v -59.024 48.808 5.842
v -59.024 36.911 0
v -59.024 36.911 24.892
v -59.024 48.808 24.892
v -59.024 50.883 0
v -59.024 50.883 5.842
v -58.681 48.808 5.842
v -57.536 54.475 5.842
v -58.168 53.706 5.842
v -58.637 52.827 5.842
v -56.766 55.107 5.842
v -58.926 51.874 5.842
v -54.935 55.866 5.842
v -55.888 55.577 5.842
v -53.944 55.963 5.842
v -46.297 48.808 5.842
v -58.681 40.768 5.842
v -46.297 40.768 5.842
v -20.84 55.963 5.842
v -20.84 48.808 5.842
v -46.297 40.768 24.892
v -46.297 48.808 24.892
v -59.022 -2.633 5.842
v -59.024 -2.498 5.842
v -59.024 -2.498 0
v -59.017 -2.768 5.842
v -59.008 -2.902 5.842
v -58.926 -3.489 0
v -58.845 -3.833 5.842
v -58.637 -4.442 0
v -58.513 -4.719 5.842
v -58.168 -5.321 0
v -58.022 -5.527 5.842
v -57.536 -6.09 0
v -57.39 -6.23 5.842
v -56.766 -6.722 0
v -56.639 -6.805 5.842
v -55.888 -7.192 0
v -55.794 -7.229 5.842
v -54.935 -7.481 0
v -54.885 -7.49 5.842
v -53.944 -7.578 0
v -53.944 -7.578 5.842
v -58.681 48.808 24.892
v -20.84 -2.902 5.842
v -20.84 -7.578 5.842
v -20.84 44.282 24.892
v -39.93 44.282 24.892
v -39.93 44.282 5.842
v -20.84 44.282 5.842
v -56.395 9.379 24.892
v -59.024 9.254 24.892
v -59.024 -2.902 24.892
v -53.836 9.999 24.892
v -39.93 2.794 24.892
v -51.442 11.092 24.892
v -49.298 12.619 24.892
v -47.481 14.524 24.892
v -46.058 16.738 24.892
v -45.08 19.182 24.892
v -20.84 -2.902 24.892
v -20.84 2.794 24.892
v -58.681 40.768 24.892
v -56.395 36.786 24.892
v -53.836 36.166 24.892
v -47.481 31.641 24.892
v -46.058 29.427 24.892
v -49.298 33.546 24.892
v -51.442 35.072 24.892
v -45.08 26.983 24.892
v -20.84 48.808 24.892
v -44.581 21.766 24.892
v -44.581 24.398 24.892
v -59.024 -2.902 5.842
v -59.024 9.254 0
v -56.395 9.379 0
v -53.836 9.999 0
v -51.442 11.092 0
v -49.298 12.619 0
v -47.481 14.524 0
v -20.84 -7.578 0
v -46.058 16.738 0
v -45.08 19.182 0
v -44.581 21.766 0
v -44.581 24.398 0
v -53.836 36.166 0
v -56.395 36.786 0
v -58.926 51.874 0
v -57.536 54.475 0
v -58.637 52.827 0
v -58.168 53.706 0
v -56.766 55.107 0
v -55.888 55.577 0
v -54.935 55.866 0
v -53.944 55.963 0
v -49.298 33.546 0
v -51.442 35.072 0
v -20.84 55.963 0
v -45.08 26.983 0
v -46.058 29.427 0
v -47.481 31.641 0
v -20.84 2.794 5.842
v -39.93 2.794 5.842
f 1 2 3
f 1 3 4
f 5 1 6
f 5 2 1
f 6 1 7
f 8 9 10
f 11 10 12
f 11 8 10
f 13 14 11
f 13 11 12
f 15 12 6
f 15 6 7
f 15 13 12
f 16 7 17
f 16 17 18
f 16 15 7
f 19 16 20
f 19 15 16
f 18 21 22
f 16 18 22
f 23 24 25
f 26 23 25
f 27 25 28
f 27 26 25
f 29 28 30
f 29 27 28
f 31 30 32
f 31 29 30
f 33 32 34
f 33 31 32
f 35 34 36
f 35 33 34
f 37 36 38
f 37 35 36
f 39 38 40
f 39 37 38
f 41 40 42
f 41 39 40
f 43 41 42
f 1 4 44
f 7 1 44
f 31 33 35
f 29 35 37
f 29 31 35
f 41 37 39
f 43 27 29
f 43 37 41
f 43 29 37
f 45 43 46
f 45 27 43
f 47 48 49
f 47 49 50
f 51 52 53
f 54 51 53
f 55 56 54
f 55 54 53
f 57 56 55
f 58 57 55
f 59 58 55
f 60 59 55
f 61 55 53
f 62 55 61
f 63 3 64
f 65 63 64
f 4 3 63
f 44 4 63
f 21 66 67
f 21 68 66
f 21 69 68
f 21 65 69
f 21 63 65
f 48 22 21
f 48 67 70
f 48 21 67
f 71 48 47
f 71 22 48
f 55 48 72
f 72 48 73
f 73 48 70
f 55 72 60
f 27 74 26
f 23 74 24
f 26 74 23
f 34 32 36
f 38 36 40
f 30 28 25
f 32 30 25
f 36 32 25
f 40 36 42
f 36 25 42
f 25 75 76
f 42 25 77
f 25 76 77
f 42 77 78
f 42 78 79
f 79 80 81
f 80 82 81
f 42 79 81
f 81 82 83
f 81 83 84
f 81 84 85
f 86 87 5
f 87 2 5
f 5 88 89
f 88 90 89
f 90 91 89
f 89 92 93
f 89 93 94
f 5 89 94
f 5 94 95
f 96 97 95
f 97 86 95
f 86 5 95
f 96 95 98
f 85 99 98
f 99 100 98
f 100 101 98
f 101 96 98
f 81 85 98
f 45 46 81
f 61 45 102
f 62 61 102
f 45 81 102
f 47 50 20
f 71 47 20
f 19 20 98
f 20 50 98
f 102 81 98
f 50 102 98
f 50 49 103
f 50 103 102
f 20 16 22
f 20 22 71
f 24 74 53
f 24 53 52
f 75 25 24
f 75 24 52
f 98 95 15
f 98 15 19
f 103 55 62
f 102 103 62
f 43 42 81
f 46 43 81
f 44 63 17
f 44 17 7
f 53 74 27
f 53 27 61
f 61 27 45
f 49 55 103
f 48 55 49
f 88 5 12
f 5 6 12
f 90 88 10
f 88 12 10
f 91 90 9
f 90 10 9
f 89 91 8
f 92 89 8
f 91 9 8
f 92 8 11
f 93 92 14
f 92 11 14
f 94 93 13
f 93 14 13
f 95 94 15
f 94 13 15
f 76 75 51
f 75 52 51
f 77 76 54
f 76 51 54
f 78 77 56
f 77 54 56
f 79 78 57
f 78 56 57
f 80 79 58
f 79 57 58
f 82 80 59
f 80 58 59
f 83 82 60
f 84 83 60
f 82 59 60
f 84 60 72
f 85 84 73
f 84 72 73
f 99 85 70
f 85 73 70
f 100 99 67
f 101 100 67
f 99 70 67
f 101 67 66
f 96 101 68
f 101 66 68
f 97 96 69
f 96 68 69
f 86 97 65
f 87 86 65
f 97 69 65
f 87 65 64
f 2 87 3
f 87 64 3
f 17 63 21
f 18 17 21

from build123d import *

# Parameters (mm, degrees)
F0_W      = 38.1832793355
F0_H      = 63.5416381992
F1_DEPTH  = 5.842
F2_R      = 5.08
F3_W      = 38.1832793355
F3_H      = 51.7094545066
F4_DEPTH  = 19.05
F5_W      = 19.0890878439
F5_H      = 41.4883207995
F6_DEPTH  = 19.05
F8_R      = 13.8442198494
F9_DEPTH  = 25.4
F10_W     = 12.3838447034
F10_H     = 8.160058409
F11_DEPTH = 19.05


with BuildPart() as f1:
    # F0 (on Top) → F1 (new body)
    with BuildSketch(Plane.XY):
        with Locations((-39.9321317673, 24.1924587172)):
            Rectangle(F0_W, F0_H)
    extrude(amount=F1_DEPTH)

    # F2
    f2_edges = [f1.edges().sort_by_distance(p)[0] for p in [
        (-59.023771, 55.963278, 2.921),
        (-59.023771, -7.57836, 2.921),
    ]]
    fillet(f2_edges, radius=F2_R)

    # F3 (on face) → F4 (join)
    with BuildSketch(Plane.XY.offset(5.842)):
        with Locations((-39.9321317673, 22.9528117925)):
            Rectangle(F3_W, F3_H)
    extrude(amount=F4_DEPTH)

    # F5 (on face) → F6 (cut)
    with BuildSketch(Plane.XY.offset(24.892)):
        with Locations((-30.3850360215, 23.5381604871)):
            Rectangle(F5_W, F5_H)
    extrude(amount=-F6_DEPTH, mode=Mode.SUBTRACT)

    # F8 (on face) → F9 (cut)
    with BuildSketch(Plane.XY.offset(24.892)):
        with Locations((-58.3629384637, 23.0822730809)):
            Circle(F8_R)
    extrude(amount=-F9_DEPTH, mode=Mode.SUBTRACT)

    # F10 (on face) → F11 (cut)
    with BuildSketch(Plane.XY.offset(24.892)):
        with Locations((-52.489342168, 44.8476765305)):
            Rectangle(F10_W, F10_H)
    extrude(amount=-F11_DEPTH, mode=Mode.SUBTRACT)


solid = f1.part
